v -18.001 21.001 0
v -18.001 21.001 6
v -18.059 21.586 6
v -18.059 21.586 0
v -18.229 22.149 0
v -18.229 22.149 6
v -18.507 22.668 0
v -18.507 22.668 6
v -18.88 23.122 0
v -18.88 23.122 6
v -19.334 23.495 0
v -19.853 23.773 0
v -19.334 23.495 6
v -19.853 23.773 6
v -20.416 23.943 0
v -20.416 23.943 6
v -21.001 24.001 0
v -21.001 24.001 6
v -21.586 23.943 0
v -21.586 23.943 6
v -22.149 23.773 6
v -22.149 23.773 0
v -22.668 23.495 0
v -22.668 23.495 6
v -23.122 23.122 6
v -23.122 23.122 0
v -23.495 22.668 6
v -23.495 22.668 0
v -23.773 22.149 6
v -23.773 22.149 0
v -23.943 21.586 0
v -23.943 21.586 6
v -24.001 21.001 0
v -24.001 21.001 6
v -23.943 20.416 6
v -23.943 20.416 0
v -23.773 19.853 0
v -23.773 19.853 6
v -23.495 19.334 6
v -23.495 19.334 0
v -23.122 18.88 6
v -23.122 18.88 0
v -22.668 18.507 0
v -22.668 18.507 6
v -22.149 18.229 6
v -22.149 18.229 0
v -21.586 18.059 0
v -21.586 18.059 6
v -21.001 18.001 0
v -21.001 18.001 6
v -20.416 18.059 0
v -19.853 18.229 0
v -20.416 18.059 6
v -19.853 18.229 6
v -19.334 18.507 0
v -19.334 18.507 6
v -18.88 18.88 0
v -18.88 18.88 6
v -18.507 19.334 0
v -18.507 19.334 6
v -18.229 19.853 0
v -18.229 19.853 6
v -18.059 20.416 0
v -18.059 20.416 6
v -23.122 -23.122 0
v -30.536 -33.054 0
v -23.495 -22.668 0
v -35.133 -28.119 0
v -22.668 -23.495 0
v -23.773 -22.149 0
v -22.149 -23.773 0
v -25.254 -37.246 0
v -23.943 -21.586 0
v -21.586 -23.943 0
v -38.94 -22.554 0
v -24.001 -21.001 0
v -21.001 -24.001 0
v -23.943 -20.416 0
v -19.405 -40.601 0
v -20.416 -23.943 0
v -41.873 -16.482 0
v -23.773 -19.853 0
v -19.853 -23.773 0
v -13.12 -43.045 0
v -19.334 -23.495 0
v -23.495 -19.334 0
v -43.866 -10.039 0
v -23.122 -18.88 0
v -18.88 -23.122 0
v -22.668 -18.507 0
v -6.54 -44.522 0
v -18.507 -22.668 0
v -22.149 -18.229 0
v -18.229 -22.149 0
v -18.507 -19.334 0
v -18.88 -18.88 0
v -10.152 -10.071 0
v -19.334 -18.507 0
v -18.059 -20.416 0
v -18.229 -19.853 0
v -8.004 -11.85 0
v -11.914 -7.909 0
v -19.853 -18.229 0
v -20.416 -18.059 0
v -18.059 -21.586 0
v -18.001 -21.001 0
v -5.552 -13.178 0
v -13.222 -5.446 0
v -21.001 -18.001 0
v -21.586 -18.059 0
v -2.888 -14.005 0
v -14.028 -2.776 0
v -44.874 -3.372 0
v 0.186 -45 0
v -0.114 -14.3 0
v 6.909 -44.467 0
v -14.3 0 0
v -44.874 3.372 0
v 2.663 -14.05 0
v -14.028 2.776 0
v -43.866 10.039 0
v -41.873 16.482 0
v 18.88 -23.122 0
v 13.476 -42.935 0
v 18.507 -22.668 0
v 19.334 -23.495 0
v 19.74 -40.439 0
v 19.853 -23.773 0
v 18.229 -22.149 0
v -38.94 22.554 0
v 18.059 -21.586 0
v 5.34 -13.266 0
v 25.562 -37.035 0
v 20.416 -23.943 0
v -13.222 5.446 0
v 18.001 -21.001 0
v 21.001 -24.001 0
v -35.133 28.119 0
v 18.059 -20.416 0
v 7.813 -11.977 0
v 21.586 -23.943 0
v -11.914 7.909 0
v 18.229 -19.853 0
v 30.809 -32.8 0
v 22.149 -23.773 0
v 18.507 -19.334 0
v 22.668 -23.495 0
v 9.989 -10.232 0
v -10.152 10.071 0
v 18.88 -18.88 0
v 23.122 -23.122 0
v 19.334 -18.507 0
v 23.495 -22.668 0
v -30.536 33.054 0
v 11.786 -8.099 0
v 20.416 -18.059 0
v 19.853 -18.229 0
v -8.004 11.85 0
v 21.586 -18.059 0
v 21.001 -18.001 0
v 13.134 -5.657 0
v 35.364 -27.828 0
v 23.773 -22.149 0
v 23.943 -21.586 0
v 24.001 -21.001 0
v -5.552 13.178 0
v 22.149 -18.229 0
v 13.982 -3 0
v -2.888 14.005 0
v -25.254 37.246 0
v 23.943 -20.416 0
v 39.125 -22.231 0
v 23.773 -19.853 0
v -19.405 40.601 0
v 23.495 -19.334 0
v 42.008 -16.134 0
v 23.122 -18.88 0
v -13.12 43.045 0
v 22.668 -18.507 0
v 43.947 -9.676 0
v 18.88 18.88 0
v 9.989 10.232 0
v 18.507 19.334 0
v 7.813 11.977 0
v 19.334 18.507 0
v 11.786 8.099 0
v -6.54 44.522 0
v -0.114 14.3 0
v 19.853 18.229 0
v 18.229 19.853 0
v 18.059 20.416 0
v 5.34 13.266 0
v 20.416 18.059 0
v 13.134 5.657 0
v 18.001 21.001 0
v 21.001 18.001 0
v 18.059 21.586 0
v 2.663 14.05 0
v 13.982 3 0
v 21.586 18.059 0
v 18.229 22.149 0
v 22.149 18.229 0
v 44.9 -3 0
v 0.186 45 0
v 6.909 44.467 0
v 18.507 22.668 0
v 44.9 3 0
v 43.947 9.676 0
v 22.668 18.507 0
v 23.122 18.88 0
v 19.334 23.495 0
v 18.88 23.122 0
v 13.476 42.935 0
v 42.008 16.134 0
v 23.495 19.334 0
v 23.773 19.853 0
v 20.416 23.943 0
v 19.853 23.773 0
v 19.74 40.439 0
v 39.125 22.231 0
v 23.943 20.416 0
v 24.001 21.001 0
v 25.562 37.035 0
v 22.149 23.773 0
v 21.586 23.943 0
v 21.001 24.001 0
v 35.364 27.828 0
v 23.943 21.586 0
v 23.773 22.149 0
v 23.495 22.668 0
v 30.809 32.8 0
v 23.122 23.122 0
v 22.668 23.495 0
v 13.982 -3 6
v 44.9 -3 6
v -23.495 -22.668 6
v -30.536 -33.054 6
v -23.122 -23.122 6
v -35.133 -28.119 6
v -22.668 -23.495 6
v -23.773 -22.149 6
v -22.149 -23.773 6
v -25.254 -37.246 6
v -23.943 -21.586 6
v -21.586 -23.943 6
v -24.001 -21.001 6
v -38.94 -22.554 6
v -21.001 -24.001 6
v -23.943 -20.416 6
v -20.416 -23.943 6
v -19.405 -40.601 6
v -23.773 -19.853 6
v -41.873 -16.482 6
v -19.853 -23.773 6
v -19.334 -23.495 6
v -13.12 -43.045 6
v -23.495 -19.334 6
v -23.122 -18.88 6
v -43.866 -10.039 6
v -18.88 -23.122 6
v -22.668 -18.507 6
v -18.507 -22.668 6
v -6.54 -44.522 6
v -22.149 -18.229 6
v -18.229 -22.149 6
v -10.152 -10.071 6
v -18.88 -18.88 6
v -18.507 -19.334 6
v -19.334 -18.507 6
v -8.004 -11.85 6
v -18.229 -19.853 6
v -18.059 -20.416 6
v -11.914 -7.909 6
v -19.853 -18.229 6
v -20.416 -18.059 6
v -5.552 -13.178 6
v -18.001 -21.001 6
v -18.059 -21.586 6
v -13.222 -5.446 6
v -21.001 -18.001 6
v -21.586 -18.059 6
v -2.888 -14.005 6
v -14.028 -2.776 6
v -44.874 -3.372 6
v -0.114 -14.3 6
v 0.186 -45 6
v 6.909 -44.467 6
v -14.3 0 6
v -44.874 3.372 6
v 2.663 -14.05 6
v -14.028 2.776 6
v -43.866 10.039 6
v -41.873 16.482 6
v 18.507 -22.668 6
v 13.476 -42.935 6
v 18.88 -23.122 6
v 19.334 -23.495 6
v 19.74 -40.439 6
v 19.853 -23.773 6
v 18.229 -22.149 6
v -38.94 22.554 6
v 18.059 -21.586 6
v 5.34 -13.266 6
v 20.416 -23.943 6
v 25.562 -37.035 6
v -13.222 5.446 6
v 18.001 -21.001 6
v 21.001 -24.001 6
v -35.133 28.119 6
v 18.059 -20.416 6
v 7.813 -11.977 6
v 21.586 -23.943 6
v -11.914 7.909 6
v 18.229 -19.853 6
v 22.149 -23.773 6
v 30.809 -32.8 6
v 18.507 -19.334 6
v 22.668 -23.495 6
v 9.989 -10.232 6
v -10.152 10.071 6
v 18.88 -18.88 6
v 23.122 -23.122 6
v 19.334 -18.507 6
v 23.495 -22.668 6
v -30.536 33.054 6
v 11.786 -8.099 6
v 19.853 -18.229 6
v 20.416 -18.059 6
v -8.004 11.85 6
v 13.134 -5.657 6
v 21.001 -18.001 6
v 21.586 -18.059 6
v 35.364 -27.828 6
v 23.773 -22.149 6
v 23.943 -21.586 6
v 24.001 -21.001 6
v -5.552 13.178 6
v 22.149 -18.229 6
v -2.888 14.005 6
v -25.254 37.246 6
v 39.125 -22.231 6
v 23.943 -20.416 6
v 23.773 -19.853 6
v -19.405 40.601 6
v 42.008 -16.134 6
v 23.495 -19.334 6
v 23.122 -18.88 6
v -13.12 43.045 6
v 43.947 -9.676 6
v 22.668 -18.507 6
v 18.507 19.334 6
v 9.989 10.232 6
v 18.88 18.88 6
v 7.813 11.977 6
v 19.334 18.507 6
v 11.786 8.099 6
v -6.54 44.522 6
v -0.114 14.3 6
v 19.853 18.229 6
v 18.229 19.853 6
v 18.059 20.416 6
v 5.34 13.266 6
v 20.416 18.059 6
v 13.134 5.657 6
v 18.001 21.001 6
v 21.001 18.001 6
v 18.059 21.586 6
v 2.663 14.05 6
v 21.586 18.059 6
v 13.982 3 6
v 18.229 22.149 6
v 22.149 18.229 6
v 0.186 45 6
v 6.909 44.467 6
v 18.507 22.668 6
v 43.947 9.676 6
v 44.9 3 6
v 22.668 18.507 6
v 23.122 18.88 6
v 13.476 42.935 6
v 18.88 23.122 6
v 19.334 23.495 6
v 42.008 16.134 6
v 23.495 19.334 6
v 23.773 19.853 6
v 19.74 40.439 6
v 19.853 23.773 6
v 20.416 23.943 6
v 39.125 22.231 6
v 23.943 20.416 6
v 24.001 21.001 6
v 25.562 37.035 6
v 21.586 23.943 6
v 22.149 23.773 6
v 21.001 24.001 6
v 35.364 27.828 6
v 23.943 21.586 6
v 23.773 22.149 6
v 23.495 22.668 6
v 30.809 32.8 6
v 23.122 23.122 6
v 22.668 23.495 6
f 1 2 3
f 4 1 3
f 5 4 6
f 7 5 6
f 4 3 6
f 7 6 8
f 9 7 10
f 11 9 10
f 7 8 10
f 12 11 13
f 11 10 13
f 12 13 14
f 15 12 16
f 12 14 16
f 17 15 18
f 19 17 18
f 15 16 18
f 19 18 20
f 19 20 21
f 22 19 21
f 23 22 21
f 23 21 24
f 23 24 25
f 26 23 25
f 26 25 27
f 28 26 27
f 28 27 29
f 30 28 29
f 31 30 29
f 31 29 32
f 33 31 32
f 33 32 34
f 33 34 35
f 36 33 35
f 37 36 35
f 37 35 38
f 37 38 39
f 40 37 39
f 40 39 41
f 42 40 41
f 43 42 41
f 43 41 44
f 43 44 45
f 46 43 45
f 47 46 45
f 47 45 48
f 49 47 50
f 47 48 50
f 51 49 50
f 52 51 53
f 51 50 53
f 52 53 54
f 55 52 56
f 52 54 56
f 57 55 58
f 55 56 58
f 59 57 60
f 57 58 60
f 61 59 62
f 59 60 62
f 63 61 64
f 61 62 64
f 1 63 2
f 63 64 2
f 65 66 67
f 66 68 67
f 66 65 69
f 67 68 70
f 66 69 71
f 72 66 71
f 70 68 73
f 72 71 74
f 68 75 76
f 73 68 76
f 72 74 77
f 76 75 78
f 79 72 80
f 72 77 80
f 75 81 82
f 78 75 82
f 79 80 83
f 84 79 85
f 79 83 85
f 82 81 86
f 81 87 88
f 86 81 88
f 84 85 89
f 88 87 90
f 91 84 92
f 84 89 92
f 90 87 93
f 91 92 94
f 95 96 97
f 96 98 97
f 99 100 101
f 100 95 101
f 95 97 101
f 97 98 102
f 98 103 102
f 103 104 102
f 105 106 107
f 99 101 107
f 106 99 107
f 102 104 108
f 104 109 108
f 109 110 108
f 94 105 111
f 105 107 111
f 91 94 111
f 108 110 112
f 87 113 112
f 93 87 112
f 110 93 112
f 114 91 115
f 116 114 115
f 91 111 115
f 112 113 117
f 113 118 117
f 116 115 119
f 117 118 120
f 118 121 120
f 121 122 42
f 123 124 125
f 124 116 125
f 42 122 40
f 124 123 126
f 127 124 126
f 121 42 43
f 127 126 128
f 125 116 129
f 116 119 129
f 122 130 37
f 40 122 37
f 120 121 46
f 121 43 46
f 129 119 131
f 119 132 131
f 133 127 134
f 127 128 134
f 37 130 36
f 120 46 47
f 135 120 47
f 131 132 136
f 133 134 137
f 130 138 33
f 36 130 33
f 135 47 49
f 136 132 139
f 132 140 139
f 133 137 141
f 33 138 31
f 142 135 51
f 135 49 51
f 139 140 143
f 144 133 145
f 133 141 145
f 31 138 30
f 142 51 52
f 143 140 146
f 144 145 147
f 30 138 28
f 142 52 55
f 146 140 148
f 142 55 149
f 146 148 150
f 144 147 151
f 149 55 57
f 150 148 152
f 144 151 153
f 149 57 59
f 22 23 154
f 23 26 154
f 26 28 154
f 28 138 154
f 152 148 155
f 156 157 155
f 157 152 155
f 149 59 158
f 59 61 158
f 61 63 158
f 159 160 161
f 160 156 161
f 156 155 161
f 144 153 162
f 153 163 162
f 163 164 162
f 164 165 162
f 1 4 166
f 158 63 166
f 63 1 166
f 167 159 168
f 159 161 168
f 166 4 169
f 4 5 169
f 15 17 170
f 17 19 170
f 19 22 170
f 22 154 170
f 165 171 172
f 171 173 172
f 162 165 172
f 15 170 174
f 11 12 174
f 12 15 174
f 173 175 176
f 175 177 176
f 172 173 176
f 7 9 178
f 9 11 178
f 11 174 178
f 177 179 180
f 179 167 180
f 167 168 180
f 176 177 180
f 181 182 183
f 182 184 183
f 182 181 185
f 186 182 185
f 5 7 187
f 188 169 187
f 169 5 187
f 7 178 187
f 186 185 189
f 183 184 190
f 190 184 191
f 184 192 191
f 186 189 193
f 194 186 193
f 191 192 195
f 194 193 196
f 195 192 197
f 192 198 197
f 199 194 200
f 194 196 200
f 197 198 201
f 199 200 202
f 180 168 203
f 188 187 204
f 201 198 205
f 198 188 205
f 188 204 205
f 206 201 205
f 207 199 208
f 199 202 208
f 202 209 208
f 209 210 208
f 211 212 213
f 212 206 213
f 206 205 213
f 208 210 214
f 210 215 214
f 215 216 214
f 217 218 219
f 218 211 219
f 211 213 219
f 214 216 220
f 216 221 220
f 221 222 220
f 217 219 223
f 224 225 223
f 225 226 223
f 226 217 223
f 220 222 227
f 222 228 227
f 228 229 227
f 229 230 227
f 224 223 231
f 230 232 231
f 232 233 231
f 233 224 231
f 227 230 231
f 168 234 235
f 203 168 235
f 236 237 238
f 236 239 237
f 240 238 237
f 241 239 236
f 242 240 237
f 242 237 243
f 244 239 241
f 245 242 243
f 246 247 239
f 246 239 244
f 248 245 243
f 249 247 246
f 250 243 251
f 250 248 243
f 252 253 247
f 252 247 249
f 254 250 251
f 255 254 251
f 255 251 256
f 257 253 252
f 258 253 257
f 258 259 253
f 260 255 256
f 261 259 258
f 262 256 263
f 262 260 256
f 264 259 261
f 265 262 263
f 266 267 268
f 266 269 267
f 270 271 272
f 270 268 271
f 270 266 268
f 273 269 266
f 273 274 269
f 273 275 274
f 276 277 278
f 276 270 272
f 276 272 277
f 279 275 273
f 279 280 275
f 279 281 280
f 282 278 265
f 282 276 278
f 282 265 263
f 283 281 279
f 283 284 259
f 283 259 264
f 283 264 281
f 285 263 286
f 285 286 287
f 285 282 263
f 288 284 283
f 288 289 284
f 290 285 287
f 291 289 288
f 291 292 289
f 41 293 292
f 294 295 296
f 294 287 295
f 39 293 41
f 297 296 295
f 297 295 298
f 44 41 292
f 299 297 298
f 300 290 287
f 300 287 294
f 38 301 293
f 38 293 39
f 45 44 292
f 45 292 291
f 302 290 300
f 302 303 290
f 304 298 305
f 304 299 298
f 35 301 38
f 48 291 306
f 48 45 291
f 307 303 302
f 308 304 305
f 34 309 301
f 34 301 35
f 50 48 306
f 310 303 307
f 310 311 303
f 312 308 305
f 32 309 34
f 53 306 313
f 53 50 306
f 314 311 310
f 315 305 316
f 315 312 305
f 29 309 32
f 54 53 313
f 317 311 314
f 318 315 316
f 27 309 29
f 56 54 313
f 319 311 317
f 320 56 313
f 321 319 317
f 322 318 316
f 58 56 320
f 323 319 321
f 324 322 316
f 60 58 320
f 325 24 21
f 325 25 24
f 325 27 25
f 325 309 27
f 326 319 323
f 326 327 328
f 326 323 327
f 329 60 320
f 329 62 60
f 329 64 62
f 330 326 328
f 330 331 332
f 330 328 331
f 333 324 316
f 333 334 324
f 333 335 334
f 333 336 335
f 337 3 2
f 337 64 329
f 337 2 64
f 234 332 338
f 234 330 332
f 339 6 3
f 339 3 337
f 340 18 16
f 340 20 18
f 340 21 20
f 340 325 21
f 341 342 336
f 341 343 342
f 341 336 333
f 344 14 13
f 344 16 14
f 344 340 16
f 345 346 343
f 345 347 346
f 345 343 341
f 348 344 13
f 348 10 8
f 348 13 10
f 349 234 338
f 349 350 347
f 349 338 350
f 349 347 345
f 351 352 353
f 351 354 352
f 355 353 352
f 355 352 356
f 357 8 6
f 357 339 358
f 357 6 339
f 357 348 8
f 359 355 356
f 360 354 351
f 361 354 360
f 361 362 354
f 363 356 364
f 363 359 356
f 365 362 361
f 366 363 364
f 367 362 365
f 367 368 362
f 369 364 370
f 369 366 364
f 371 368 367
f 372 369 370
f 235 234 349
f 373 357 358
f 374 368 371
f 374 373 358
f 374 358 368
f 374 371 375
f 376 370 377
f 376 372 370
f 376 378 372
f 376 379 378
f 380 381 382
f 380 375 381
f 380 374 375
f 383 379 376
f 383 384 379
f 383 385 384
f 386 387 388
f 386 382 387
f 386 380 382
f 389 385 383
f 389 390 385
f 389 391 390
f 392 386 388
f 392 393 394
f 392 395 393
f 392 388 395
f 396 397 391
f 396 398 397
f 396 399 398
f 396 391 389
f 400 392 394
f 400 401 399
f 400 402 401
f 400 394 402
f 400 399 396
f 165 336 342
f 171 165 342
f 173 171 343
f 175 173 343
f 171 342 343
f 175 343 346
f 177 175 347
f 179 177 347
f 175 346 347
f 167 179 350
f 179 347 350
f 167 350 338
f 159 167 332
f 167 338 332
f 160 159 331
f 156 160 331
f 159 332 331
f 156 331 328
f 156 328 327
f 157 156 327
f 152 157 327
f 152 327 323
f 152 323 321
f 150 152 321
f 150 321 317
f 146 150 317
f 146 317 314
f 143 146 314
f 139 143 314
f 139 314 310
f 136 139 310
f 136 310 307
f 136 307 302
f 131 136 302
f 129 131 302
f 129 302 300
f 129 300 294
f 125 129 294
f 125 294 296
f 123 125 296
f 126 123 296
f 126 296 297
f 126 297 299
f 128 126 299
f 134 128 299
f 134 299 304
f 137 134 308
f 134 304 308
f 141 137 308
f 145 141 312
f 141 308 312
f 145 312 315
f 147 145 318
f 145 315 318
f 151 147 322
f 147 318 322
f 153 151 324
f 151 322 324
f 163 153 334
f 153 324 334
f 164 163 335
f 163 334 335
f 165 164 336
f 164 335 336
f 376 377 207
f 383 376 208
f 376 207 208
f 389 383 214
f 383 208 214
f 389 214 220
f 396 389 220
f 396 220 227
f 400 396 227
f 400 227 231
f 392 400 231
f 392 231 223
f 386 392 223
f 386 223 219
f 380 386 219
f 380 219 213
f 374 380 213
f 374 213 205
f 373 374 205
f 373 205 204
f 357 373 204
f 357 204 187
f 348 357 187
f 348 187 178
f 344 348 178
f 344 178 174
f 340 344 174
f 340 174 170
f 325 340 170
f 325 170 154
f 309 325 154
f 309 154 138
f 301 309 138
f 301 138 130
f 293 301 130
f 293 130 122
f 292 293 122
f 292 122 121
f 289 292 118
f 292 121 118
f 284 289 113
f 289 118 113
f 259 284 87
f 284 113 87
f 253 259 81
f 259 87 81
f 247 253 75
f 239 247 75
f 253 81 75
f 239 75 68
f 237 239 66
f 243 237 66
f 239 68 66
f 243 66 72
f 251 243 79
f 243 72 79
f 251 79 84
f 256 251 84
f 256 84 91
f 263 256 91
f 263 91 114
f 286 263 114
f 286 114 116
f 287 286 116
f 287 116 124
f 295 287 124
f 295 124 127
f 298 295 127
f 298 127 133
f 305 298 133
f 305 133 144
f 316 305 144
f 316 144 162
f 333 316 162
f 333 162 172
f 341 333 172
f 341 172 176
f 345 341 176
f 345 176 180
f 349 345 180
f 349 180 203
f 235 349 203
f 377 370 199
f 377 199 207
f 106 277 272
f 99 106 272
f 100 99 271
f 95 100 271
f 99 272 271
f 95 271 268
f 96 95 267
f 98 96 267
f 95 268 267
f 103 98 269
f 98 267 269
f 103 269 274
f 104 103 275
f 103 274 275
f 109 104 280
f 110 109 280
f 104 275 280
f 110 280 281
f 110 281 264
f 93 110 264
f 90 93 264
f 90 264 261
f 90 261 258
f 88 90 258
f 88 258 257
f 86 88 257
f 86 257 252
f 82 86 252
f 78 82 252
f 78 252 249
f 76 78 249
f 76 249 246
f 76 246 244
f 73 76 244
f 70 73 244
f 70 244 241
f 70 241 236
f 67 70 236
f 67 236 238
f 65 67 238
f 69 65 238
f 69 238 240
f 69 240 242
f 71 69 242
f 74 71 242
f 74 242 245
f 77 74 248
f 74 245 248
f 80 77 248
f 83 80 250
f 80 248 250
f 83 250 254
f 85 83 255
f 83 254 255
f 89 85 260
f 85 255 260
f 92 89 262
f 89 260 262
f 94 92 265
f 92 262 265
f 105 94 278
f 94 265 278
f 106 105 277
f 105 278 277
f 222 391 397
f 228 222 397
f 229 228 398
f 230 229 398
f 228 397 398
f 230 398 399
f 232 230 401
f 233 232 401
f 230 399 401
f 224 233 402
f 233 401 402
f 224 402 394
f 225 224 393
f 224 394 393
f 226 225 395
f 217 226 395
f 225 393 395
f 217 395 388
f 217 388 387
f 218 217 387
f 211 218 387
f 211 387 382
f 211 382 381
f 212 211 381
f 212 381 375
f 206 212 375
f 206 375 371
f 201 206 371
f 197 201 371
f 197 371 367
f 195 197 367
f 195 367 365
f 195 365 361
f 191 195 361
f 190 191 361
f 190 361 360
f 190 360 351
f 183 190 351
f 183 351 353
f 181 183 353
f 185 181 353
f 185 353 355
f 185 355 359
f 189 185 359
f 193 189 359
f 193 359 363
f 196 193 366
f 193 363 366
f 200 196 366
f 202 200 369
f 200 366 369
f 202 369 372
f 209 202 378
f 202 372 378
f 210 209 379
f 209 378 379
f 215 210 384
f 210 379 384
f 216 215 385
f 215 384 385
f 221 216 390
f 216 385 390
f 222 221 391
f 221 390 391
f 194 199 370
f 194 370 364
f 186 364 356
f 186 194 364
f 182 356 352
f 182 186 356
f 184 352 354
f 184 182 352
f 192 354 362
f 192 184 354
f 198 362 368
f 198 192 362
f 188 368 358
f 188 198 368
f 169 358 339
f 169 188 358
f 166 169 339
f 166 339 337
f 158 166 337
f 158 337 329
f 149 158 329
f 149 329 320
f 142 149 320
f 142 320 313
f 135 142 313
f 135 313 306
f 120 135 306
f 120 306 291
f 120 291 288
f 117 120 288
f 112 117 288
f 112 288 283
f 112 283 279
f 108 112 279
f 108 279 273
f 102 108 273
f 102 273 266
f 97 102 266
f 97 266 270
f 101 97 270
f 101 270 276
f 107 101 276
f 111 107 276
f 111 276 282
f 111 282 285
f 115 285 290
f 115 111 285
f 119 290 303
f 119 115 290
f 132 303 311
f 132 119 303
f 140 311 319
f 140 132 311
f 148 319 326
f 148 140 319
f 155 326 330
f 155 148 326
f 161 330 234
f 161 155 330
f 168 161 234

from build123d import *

# Parameters (mm, degrees)
SKETCH_R        = 45
SKETCH_R_2      = 14.3
PAD_DEPTH       = 6
SKETCH001_R     = 3
POCKET_DEPTH    = 10
SKETCH002_W     = 50
SKETCH002_H     = 6
POCKET001_DEPTH = 10


with BuildPart() as part:
    # Sketch → Pad (new body)
    with BuildSketch(Plane.XY):
        Circle(SKETCH_R)
        Circle(SKETCH_R_2, mode=Mode.SUBTRACT)
    extrude(amount=PAD_DEPTH)

    # Sketch001 → Pocket (cut)
    with BuildSketch(Plane.XY.offset(6)):
        with Locations((-21.001071, 21.001071)):
            Circle(SKETCH001_R)
        with Locations((21.001071, 21.001071)):
            Circle(SKETCH001_R)
        with Locations((-21.001071, -21.001071)):
            Circle(SKETCH001_R)
        with Locations((21.001071, -21.001071)):
            Circle(SKETCH001_R)
    extrude(amount=-POCKET_DEPTH, mode=Mode.SUBTRACT)

    # Sketch002 → Pocket001 (cut)
    with BuildSketch(Plane.XY.offset(6)):
        with Locations((25, 0)):
            Rectangle(SKETCH002_W, SKETCH002_H)
    extrude(amount=-POCKET001_DEPTH, mode=Mode.SUBTRACT)


solid = part.part
